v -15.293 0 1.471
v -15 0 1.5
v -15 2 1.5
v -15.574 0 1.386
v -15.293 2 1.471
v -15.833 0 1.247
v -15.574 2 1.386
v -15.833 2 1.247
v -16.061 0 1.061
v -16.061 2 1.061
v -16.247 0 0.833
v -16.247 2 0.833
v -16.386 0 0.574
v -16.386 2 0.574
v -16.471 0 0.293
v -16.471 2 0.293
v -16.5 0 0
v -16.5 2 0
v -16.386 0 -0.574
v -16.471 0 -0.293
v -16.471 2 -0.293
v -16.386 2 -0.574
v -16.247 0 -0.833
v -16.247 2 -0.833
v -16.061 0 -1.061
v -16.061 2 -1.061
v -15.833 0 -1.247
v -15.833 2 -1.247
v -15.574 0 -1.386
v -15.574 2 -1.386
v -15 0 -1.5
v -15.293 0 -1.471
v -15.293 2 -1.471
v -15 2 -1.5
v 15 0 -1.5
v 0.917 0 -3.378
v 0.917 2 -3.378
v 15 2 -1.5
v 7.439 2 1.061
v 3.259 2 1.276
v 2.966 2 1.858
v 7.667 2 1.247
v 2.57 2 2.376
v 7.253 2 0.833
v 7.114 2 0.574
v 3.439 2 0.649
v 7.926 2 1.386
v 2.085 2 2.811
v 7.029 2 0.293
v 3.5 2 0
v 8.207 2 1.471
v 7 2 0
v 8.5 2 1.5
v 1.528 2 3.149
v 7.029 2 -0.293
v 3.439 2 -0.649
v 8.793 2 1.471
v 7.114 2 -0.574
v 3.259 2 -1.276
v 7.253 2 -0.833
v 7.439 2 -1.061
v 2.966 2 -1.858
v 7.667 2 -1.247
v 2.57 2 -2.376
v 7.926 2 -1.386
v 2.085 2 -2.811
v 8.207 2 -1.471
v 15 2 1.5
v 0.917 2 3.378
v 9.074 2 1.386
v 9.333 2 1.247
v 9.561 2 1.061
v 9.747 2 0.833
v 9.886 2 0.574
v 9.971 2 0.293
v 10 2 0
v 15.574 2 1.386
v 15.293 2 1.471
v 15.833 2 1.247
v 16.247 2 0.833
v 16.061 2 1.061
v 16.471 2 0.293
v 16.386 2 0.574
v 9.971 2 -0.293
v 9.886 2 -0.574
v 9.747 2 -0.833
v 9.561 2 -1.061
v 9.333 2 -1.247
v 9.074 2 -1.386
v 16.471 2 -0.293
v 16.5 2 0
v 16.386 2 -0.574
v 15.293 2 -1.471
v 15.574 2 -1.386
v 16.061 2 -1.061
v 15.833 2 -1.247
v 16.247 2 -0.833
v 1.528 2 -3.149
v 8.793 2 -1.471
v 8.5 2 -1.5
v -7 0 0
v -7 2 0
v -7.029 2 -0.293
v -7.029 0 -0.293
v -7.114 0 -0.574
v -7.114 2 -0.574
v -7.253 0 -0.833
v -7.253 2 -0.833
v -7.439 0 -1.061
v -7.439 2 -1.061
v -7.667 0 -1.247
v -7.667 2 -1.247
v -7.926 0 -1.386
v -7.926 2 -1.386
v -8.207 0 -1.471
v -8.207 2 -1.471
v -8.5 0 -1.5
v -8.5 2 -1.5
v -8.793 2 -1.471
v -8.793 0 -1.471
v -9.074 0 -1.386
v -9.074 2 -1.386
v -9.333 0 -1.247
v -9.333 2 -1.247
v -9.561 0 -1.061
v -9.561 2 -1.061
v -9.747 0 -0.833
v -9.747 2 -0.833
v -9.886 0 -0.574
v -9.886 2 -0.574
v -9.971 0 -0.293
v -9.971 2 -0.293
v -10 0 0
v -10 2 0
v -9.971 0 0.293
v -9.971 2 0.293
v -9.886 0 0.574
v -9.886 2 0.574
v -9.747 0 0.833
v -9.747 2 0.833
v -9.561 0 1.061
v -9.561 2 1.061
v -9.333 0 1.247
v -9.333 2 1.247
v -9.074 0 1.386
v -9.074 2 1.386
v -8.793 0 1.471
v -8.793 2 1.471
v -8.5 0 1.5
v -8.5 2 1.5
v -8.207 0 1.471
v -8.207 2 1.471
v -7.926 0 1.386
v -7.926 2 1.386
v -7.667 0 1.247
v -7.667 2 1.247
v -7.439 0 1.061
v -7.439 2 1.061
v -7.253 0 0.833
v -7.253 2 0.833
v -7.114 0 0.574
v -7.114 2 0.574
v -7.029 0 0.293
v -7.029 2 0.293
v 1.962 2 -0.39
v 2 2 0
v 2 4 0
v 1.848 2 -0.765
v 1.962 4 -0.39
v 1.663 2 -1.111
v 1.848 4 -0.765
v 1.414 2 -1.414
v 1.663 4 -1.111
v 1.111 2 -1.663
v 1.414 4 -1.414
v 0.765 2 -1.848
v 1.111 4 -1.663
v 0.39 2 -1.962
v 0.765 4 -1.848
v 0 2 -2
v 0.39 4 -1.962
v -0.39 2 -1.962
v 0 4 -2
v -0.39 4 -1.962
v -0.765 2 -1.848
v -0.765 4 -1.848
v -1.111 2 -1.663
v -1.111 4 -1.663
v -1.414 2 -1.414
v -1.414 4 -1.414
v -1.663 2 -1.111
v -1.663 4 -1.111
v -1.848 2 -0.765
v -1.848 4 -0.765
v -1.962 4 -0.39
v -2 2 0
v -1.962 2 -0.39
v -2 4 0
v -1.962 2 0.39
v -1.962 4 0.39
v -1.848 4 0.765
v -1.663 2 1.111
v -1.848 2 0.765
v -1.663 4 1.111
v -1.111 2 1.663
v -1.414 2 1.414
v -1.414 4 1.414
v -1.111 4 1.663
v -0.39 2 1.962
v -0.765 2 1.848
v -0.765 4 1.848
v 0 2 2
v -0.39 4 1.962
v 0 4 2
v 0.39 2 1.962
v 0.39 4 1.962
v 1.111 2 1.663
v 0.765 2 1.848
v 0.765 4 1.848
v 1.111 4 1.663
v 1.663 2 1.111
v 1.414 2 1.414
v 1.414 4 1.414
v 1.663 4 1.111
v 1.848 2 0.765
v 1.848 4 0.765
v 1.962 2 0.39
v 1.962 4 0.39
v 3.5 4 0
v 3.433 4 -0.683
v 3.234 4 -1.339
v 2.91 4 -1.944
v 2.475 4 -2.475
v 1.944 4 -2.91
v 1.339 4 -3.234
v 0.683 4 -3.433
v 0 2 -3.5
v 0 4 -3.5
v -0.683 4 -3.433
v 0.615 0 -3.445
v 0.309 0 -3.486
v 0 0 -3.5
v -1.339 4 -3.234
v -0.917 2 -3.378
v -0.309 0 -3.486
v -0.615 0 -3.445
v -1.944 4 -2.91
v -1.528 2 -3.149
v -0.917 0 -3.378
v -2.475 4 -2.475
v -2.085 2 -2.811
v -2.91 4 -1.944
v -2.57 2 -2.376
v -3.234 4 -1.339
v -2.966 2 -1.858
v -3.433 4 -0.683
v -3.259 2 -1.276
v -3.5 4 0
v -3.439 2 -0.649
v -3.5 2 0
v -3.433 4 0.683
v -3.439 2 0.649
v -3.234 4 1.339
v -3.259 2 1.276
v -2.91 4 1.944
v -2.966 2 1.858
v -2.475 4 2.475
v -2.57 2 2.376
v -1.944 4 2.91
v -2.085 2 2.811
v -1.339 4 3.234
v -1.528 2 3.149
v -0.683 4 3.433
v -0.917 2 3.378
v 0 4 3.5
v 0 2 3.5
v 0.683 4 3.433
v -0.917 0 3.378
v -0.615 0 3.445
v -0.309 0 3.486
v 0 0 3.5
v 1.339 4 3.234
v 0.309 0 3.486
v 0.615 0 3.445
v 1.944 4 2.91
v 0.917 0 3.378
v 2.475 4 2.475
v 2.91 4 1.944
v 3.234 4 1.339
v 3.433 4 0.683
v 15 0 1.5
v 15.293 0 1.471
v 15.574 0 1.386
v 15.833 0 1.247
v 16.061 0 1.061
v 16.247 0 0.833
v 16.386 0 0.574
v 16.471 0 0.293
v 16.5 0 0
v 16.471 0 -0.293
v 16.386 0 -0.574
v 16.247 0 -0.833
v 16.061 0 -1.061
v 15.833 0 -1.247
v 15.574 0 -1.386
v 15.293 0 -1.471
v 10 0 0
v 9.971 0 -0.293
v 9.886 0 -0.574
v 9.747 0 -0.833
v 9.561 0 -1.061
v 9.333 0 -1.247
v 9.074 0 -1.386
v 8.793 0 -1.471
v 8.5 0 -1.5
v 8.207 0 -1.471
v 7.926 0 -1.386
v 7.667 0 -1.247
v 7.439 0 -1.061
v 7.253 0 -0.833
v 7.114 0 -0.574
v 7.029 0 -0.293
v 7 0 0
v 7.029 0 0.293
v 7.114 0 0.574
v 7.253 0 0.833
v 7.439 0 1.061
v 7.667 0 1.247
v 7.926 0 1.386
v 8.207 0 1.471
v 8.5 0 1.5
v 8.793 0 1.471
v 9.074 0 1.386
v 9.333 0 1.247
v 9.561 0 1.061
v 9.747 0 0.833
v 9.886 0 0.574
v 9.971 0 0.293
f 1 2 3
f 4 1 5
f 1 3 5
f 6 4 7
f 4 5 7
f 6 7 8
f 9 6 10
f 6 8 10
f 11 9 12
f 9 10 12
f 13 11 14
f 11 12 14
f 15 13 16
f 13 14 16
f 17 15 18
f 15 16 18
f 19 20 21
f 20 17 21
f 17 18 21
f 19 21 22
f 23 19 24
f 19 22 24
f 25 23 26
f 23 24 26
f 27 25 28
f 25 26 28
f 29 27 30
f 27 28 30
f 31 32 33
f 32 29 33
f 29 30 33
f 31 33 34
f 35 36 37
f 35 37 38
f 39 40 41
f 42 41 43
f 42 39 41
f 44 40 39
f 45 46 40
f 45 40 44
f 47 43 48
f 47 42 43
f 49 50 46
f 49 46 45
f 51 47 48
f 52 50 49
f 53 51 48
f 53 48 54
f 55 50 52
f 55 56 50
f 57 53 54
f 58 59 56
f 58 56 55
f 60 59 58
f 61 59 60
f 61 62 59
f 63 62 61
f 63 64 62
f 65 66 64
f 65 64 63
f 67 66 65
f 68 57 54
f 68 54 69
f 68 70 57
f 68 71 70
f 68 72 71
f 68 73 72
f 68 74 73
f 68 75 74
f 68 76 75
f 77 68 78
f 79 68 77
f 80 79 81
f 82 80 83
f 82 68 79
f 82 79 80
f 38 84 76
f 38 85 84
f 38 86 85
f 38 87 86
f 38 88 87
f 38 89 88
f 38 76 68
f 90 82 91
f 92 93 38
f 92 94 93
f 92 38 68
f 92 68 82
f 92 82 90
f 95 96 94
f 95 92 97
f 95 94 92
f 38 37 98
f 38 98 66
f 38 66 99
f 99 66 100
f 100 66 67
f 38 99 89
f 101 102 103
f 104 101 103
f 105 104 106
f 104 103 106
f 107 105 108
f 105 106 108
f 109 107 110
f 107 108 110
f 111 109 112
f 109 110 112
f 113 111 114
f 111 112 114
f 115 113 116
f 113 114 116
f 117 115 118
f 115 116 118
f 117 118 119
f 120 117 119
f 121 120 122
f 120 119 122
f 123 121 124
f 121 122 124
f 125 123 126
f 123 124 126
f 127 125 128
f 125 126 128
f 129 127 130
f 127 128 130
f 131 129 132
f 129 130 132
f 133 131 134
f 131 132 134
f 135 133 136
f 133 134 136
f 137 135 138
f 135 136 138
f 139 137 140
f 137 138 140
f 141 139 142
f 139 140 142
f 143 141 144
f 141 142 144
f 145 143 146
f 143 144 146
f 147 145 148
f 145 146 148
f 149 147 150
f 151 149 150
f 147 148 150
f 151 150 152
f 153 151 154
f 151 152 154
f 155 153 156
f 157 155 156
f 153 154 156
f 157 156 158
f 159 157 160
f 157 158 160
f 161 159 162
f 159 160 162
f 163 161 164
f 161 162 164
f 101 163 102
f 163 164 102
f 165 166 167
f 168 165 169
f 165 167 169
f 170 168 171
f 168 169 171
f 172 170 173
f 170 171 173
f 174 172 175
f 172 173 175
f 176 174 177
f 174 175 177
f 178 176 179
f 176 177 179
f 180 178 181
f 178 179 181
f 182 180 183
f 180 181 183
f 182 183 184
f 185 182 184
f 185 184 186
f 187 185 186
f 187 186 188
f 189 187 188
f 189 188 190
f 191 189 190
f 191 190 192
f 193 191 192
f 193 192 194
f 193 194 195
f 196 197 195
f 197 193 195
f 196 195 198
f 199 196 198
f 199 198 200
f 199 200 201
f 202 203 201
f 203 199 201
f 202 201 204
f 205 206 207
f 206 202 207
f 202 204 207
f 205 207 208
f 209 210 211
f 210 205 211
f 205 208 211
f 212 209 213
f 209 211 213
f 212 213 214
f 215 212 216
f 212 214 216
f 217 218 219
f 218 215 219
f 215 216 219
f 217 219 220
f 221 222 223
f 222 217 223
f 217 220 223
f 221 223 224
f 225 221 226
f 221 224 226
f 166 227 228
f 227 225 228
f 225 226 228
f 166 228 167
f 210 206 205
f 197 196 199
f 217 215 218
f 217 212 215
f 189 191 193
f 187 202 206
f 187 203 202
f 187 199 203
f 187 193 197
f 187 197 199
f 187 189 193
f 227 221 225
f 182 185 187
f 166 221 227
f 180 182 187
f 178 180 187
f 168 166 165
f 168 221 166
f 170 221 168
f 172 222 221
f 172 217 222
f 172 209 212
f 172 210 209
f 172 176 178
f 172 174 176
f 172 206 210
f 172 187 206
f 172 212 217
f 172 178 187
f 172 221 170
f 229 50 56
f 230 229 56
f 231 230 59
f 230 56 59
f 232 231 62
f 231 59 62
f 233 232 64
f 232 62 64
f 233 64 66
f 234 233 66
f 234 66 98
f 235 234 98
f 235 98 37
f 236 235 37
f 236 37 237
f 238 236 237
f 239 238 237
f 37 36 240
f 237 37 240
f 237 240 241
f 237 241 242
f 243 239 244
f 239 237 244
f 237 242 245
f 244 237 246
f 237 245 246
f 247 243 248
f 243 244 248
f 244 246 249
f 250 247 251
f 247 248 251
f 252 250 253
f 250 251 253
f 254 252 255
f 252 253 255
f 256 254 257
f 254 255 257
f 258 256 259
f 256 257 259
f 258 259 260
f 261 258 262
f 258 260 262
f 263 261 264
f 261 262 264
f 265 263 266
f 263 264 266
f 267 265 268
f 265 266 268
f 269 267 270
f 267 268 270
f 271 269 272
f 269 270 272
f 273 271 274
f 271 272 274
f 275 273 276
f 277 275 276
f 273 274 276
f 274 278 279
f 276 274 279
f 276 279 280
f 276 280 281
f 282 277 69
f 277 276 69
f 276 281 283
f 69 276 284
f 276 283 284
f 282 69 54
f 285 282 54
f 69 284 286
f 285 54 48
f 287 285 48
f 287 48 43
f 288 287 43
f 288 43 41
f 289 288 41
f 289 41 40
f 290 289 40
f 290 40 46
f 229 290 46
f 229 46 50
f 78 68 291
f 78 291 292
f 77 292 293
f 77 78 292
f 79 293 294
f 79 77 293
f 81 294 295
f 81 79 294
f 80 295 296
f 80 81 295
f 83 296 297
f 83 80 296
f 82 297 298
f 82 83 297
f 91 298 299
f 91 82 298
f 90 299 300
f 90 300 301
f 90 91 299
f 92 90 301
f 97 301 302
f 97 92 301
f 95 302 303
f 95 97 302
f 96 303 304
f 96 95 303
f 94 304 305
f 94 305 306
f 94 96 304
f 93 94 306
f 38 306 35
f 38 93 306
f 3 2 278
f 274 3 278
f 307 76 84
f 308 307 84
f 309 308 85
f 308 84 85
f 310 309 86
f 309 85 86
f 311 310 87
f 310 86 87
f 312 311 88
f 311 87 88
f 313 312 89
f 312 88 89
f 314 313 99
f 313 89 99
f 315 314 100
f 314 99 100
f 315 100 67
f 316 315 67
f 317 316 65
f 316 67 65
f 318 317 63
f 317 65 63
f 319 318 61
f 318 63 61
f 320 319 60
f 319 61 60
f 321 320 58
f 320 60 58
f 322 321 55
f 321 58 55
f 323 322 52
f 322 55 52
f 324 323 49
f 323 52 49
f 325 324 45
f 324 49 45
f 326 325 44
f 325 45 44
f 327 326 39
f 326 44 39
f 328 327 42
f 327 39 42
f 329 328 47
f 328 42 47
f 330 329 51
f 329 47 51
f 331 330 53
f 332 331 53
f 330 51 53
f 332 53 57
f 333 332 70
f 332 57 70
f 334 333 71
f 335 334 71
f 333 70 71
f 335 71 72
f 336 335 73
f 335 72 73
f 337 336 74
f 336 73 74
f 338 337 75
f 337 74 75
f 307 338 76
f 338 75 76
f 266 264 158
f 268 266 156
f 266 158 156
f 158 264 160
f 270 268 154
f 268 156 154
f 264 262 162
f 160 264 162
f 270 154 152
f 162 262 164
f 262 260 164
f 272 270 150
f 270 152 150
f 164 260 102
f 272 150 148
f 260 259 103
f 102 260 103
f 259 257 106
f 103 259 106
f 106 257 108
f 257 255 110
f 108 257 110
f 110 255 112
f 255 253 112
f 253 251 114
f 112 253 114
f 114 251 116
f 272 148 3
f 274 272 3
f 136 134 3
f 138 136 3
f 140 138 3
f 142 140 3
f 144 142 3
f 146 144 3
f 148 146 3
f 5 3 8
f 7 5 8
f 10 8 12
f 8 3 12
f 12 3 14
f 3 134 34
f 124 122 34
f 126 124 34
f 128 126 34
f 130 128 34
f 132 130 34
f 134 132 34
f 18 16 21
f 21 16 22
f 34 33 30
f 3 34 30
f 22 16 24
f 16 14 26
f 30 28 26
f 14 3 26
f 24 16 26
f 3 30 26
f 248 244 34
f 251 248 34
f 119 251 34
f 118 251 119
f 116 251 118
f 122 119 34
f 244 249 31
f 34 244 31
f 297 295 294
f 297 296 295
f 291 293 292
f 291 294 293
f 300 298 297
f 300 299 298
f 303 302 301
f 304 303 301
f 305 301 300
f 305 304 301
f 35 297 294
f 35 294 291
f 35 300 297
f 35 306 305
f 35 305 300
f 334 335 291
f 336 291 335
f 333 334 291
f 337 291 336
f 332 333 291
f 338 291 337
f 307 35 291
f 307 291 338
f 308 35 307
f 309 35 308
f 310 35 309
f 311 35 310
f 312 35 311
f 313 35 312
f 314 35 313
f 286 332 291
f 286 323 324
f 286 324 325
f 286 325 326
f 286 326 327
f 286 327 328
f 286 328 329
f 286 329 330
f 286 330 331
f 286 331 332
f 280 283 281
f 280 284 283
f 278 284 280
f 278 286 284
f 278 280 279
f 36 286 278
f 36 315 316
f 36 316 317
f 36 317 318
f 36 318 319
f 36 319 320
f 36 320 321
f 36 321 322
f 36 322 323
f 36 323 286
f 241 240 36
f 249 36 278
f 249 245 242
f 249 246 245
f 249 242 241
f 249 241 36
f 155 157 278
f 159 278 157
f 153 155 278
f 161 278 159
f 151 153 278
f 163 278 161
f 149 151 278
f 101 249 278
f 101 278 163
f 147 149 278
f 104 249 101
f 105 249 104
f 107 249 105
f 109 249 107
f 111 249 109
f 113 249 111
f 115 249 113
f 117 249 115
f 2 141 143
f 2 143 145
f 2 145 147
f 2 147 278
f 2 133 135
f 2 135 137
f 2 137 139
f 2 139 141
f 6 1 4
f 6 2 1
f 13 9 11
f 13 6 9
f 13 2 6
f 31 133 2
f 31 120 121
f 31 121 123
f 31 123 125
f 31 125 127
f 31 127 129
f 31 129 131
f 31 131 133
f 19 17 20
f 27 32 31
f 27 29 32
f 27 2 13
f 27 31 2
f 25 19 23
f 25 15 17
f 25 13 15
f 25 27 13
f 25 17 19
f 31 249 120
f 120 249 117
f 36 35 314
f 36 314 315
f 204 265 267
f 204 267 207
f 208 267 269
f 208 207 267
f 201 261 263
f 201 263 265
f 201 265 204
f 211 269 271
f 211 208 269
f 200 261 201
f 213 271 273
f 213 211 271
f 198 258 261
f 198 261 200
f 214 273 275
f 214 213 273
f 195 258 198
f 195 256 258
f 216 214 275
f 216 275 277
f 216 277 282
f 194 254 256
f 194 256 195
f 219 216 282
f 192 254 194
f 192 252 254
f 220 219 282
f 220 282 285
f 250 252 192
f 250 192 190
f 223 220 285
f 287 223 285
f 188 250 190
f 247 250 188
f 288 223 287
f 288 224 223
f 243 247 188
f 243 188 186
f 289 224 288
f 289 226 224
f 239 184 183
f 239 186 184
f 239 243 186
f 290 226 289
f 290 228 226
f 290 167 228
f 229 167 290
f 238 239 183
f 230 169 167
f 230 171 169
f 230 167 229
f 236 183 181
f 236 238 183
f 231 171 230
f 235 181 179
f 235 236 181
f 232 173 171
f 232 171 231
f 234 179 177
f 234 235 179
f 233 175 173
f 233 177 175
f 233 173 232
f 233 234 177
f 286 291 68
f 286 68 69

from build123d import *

# Parameters (mm, degrees)
ESQUISSE1_R             = 3.5
BOSS_EXTRU_1_DEPTH      = 4
ESQUISSE2_R             = 2
ENL_V_MAT_EXTRU_1_DEPTH = 2
BOSS_EXTRU_2_DEPTH      = 2
ESQUISSE4_R             = 1.5
BOSS_EXTRU_3_DEPTH      = 2
ESQUISSE5_R             = 1.5
ENL_V_MAT_EXTRU_2_DEPTH = 2


with BuildPart() as part:
    # Esquisse1 → Boss.-Extru.1 (new body)
    with BuildSketch(Plane(origin=(0, 0, 0), x_dir=(1, 0, 0), z_dir=(0, 1, 0))):
        Circle(ESQUISSE1_R)
    extrude(amount=BOSS_EXTRU_1_DEPTH)

    # Esquisse2 → Enlèv. mat.-Extru.1 (cut)
    with BuildSketch(Plane(origin=(0, 4, 0), x_dir=(1, 0, 0), z_dir=(0, 1, 0))):
        Circle(ESQUISSE2_R)
    extrude(amount=-ENL_V_MAT_EXTRU_1_DEPTH, mode=Mode.SUBTRACT)

    # Esquisse3 → Boss.-Extru.2 (add)
    with BuildSketch(Plane(origin=(0, 0, 0), x_dir=(1, 0, 0), z_dir=(0, 1, 0))):
        Polygon((0, 3.5), (15, 1.5), (15, -1.5), (0, -3.5), align=None)
    boss_extru_2 = extrude(amount=BOSS_EXTRU_2_DEPTH)

    # Esquisse4 → Boss.-Extru.3 (add)
    with BuildSketch(Plane(origin=(0, 2, 0), x_dir=(1, 0, 0), z_dir=(0, 1, 0))):
        with Locations((15, 0)):
            Circle(ESQUISSE4_R)
    boss_extru_3 = extrude(amount=-BOSS_EXTRU_3_DEPTH)

    # Symétrie1: Boss.-Extru.2, Boss.-Extru.3 across plane
    add(boss_extru_2.mirror(Plane(origin=(0, 0, 0), x_dir=(0, 0, 1), z_dir=(1, 0, 0))))
    add(boss_extru_3.mirror(Plane(origin=(0, 0, 0), x_dir=(0, 0, 1), z_dir=(1, 0, 0))))

    # Esquisse5 → Enlèv. mat.-Extru.2 (cut)
    with BuildSketch(Plane(origin=(0, 2, 0), x_dir=(1, 0, 0), z_dir=(0, 1, 0))):
        with Locations((-8.5, 0)):
            Circle(ESQUISSE5_R)
        with Locations((8.5, 0)):
            Circle(ESQUISSE5_R)
    extrude(amount=-ENL_V_MAT_EXTRU_2_DEPTH, mode=Mode.SUBTRACT)


solid = part.part
